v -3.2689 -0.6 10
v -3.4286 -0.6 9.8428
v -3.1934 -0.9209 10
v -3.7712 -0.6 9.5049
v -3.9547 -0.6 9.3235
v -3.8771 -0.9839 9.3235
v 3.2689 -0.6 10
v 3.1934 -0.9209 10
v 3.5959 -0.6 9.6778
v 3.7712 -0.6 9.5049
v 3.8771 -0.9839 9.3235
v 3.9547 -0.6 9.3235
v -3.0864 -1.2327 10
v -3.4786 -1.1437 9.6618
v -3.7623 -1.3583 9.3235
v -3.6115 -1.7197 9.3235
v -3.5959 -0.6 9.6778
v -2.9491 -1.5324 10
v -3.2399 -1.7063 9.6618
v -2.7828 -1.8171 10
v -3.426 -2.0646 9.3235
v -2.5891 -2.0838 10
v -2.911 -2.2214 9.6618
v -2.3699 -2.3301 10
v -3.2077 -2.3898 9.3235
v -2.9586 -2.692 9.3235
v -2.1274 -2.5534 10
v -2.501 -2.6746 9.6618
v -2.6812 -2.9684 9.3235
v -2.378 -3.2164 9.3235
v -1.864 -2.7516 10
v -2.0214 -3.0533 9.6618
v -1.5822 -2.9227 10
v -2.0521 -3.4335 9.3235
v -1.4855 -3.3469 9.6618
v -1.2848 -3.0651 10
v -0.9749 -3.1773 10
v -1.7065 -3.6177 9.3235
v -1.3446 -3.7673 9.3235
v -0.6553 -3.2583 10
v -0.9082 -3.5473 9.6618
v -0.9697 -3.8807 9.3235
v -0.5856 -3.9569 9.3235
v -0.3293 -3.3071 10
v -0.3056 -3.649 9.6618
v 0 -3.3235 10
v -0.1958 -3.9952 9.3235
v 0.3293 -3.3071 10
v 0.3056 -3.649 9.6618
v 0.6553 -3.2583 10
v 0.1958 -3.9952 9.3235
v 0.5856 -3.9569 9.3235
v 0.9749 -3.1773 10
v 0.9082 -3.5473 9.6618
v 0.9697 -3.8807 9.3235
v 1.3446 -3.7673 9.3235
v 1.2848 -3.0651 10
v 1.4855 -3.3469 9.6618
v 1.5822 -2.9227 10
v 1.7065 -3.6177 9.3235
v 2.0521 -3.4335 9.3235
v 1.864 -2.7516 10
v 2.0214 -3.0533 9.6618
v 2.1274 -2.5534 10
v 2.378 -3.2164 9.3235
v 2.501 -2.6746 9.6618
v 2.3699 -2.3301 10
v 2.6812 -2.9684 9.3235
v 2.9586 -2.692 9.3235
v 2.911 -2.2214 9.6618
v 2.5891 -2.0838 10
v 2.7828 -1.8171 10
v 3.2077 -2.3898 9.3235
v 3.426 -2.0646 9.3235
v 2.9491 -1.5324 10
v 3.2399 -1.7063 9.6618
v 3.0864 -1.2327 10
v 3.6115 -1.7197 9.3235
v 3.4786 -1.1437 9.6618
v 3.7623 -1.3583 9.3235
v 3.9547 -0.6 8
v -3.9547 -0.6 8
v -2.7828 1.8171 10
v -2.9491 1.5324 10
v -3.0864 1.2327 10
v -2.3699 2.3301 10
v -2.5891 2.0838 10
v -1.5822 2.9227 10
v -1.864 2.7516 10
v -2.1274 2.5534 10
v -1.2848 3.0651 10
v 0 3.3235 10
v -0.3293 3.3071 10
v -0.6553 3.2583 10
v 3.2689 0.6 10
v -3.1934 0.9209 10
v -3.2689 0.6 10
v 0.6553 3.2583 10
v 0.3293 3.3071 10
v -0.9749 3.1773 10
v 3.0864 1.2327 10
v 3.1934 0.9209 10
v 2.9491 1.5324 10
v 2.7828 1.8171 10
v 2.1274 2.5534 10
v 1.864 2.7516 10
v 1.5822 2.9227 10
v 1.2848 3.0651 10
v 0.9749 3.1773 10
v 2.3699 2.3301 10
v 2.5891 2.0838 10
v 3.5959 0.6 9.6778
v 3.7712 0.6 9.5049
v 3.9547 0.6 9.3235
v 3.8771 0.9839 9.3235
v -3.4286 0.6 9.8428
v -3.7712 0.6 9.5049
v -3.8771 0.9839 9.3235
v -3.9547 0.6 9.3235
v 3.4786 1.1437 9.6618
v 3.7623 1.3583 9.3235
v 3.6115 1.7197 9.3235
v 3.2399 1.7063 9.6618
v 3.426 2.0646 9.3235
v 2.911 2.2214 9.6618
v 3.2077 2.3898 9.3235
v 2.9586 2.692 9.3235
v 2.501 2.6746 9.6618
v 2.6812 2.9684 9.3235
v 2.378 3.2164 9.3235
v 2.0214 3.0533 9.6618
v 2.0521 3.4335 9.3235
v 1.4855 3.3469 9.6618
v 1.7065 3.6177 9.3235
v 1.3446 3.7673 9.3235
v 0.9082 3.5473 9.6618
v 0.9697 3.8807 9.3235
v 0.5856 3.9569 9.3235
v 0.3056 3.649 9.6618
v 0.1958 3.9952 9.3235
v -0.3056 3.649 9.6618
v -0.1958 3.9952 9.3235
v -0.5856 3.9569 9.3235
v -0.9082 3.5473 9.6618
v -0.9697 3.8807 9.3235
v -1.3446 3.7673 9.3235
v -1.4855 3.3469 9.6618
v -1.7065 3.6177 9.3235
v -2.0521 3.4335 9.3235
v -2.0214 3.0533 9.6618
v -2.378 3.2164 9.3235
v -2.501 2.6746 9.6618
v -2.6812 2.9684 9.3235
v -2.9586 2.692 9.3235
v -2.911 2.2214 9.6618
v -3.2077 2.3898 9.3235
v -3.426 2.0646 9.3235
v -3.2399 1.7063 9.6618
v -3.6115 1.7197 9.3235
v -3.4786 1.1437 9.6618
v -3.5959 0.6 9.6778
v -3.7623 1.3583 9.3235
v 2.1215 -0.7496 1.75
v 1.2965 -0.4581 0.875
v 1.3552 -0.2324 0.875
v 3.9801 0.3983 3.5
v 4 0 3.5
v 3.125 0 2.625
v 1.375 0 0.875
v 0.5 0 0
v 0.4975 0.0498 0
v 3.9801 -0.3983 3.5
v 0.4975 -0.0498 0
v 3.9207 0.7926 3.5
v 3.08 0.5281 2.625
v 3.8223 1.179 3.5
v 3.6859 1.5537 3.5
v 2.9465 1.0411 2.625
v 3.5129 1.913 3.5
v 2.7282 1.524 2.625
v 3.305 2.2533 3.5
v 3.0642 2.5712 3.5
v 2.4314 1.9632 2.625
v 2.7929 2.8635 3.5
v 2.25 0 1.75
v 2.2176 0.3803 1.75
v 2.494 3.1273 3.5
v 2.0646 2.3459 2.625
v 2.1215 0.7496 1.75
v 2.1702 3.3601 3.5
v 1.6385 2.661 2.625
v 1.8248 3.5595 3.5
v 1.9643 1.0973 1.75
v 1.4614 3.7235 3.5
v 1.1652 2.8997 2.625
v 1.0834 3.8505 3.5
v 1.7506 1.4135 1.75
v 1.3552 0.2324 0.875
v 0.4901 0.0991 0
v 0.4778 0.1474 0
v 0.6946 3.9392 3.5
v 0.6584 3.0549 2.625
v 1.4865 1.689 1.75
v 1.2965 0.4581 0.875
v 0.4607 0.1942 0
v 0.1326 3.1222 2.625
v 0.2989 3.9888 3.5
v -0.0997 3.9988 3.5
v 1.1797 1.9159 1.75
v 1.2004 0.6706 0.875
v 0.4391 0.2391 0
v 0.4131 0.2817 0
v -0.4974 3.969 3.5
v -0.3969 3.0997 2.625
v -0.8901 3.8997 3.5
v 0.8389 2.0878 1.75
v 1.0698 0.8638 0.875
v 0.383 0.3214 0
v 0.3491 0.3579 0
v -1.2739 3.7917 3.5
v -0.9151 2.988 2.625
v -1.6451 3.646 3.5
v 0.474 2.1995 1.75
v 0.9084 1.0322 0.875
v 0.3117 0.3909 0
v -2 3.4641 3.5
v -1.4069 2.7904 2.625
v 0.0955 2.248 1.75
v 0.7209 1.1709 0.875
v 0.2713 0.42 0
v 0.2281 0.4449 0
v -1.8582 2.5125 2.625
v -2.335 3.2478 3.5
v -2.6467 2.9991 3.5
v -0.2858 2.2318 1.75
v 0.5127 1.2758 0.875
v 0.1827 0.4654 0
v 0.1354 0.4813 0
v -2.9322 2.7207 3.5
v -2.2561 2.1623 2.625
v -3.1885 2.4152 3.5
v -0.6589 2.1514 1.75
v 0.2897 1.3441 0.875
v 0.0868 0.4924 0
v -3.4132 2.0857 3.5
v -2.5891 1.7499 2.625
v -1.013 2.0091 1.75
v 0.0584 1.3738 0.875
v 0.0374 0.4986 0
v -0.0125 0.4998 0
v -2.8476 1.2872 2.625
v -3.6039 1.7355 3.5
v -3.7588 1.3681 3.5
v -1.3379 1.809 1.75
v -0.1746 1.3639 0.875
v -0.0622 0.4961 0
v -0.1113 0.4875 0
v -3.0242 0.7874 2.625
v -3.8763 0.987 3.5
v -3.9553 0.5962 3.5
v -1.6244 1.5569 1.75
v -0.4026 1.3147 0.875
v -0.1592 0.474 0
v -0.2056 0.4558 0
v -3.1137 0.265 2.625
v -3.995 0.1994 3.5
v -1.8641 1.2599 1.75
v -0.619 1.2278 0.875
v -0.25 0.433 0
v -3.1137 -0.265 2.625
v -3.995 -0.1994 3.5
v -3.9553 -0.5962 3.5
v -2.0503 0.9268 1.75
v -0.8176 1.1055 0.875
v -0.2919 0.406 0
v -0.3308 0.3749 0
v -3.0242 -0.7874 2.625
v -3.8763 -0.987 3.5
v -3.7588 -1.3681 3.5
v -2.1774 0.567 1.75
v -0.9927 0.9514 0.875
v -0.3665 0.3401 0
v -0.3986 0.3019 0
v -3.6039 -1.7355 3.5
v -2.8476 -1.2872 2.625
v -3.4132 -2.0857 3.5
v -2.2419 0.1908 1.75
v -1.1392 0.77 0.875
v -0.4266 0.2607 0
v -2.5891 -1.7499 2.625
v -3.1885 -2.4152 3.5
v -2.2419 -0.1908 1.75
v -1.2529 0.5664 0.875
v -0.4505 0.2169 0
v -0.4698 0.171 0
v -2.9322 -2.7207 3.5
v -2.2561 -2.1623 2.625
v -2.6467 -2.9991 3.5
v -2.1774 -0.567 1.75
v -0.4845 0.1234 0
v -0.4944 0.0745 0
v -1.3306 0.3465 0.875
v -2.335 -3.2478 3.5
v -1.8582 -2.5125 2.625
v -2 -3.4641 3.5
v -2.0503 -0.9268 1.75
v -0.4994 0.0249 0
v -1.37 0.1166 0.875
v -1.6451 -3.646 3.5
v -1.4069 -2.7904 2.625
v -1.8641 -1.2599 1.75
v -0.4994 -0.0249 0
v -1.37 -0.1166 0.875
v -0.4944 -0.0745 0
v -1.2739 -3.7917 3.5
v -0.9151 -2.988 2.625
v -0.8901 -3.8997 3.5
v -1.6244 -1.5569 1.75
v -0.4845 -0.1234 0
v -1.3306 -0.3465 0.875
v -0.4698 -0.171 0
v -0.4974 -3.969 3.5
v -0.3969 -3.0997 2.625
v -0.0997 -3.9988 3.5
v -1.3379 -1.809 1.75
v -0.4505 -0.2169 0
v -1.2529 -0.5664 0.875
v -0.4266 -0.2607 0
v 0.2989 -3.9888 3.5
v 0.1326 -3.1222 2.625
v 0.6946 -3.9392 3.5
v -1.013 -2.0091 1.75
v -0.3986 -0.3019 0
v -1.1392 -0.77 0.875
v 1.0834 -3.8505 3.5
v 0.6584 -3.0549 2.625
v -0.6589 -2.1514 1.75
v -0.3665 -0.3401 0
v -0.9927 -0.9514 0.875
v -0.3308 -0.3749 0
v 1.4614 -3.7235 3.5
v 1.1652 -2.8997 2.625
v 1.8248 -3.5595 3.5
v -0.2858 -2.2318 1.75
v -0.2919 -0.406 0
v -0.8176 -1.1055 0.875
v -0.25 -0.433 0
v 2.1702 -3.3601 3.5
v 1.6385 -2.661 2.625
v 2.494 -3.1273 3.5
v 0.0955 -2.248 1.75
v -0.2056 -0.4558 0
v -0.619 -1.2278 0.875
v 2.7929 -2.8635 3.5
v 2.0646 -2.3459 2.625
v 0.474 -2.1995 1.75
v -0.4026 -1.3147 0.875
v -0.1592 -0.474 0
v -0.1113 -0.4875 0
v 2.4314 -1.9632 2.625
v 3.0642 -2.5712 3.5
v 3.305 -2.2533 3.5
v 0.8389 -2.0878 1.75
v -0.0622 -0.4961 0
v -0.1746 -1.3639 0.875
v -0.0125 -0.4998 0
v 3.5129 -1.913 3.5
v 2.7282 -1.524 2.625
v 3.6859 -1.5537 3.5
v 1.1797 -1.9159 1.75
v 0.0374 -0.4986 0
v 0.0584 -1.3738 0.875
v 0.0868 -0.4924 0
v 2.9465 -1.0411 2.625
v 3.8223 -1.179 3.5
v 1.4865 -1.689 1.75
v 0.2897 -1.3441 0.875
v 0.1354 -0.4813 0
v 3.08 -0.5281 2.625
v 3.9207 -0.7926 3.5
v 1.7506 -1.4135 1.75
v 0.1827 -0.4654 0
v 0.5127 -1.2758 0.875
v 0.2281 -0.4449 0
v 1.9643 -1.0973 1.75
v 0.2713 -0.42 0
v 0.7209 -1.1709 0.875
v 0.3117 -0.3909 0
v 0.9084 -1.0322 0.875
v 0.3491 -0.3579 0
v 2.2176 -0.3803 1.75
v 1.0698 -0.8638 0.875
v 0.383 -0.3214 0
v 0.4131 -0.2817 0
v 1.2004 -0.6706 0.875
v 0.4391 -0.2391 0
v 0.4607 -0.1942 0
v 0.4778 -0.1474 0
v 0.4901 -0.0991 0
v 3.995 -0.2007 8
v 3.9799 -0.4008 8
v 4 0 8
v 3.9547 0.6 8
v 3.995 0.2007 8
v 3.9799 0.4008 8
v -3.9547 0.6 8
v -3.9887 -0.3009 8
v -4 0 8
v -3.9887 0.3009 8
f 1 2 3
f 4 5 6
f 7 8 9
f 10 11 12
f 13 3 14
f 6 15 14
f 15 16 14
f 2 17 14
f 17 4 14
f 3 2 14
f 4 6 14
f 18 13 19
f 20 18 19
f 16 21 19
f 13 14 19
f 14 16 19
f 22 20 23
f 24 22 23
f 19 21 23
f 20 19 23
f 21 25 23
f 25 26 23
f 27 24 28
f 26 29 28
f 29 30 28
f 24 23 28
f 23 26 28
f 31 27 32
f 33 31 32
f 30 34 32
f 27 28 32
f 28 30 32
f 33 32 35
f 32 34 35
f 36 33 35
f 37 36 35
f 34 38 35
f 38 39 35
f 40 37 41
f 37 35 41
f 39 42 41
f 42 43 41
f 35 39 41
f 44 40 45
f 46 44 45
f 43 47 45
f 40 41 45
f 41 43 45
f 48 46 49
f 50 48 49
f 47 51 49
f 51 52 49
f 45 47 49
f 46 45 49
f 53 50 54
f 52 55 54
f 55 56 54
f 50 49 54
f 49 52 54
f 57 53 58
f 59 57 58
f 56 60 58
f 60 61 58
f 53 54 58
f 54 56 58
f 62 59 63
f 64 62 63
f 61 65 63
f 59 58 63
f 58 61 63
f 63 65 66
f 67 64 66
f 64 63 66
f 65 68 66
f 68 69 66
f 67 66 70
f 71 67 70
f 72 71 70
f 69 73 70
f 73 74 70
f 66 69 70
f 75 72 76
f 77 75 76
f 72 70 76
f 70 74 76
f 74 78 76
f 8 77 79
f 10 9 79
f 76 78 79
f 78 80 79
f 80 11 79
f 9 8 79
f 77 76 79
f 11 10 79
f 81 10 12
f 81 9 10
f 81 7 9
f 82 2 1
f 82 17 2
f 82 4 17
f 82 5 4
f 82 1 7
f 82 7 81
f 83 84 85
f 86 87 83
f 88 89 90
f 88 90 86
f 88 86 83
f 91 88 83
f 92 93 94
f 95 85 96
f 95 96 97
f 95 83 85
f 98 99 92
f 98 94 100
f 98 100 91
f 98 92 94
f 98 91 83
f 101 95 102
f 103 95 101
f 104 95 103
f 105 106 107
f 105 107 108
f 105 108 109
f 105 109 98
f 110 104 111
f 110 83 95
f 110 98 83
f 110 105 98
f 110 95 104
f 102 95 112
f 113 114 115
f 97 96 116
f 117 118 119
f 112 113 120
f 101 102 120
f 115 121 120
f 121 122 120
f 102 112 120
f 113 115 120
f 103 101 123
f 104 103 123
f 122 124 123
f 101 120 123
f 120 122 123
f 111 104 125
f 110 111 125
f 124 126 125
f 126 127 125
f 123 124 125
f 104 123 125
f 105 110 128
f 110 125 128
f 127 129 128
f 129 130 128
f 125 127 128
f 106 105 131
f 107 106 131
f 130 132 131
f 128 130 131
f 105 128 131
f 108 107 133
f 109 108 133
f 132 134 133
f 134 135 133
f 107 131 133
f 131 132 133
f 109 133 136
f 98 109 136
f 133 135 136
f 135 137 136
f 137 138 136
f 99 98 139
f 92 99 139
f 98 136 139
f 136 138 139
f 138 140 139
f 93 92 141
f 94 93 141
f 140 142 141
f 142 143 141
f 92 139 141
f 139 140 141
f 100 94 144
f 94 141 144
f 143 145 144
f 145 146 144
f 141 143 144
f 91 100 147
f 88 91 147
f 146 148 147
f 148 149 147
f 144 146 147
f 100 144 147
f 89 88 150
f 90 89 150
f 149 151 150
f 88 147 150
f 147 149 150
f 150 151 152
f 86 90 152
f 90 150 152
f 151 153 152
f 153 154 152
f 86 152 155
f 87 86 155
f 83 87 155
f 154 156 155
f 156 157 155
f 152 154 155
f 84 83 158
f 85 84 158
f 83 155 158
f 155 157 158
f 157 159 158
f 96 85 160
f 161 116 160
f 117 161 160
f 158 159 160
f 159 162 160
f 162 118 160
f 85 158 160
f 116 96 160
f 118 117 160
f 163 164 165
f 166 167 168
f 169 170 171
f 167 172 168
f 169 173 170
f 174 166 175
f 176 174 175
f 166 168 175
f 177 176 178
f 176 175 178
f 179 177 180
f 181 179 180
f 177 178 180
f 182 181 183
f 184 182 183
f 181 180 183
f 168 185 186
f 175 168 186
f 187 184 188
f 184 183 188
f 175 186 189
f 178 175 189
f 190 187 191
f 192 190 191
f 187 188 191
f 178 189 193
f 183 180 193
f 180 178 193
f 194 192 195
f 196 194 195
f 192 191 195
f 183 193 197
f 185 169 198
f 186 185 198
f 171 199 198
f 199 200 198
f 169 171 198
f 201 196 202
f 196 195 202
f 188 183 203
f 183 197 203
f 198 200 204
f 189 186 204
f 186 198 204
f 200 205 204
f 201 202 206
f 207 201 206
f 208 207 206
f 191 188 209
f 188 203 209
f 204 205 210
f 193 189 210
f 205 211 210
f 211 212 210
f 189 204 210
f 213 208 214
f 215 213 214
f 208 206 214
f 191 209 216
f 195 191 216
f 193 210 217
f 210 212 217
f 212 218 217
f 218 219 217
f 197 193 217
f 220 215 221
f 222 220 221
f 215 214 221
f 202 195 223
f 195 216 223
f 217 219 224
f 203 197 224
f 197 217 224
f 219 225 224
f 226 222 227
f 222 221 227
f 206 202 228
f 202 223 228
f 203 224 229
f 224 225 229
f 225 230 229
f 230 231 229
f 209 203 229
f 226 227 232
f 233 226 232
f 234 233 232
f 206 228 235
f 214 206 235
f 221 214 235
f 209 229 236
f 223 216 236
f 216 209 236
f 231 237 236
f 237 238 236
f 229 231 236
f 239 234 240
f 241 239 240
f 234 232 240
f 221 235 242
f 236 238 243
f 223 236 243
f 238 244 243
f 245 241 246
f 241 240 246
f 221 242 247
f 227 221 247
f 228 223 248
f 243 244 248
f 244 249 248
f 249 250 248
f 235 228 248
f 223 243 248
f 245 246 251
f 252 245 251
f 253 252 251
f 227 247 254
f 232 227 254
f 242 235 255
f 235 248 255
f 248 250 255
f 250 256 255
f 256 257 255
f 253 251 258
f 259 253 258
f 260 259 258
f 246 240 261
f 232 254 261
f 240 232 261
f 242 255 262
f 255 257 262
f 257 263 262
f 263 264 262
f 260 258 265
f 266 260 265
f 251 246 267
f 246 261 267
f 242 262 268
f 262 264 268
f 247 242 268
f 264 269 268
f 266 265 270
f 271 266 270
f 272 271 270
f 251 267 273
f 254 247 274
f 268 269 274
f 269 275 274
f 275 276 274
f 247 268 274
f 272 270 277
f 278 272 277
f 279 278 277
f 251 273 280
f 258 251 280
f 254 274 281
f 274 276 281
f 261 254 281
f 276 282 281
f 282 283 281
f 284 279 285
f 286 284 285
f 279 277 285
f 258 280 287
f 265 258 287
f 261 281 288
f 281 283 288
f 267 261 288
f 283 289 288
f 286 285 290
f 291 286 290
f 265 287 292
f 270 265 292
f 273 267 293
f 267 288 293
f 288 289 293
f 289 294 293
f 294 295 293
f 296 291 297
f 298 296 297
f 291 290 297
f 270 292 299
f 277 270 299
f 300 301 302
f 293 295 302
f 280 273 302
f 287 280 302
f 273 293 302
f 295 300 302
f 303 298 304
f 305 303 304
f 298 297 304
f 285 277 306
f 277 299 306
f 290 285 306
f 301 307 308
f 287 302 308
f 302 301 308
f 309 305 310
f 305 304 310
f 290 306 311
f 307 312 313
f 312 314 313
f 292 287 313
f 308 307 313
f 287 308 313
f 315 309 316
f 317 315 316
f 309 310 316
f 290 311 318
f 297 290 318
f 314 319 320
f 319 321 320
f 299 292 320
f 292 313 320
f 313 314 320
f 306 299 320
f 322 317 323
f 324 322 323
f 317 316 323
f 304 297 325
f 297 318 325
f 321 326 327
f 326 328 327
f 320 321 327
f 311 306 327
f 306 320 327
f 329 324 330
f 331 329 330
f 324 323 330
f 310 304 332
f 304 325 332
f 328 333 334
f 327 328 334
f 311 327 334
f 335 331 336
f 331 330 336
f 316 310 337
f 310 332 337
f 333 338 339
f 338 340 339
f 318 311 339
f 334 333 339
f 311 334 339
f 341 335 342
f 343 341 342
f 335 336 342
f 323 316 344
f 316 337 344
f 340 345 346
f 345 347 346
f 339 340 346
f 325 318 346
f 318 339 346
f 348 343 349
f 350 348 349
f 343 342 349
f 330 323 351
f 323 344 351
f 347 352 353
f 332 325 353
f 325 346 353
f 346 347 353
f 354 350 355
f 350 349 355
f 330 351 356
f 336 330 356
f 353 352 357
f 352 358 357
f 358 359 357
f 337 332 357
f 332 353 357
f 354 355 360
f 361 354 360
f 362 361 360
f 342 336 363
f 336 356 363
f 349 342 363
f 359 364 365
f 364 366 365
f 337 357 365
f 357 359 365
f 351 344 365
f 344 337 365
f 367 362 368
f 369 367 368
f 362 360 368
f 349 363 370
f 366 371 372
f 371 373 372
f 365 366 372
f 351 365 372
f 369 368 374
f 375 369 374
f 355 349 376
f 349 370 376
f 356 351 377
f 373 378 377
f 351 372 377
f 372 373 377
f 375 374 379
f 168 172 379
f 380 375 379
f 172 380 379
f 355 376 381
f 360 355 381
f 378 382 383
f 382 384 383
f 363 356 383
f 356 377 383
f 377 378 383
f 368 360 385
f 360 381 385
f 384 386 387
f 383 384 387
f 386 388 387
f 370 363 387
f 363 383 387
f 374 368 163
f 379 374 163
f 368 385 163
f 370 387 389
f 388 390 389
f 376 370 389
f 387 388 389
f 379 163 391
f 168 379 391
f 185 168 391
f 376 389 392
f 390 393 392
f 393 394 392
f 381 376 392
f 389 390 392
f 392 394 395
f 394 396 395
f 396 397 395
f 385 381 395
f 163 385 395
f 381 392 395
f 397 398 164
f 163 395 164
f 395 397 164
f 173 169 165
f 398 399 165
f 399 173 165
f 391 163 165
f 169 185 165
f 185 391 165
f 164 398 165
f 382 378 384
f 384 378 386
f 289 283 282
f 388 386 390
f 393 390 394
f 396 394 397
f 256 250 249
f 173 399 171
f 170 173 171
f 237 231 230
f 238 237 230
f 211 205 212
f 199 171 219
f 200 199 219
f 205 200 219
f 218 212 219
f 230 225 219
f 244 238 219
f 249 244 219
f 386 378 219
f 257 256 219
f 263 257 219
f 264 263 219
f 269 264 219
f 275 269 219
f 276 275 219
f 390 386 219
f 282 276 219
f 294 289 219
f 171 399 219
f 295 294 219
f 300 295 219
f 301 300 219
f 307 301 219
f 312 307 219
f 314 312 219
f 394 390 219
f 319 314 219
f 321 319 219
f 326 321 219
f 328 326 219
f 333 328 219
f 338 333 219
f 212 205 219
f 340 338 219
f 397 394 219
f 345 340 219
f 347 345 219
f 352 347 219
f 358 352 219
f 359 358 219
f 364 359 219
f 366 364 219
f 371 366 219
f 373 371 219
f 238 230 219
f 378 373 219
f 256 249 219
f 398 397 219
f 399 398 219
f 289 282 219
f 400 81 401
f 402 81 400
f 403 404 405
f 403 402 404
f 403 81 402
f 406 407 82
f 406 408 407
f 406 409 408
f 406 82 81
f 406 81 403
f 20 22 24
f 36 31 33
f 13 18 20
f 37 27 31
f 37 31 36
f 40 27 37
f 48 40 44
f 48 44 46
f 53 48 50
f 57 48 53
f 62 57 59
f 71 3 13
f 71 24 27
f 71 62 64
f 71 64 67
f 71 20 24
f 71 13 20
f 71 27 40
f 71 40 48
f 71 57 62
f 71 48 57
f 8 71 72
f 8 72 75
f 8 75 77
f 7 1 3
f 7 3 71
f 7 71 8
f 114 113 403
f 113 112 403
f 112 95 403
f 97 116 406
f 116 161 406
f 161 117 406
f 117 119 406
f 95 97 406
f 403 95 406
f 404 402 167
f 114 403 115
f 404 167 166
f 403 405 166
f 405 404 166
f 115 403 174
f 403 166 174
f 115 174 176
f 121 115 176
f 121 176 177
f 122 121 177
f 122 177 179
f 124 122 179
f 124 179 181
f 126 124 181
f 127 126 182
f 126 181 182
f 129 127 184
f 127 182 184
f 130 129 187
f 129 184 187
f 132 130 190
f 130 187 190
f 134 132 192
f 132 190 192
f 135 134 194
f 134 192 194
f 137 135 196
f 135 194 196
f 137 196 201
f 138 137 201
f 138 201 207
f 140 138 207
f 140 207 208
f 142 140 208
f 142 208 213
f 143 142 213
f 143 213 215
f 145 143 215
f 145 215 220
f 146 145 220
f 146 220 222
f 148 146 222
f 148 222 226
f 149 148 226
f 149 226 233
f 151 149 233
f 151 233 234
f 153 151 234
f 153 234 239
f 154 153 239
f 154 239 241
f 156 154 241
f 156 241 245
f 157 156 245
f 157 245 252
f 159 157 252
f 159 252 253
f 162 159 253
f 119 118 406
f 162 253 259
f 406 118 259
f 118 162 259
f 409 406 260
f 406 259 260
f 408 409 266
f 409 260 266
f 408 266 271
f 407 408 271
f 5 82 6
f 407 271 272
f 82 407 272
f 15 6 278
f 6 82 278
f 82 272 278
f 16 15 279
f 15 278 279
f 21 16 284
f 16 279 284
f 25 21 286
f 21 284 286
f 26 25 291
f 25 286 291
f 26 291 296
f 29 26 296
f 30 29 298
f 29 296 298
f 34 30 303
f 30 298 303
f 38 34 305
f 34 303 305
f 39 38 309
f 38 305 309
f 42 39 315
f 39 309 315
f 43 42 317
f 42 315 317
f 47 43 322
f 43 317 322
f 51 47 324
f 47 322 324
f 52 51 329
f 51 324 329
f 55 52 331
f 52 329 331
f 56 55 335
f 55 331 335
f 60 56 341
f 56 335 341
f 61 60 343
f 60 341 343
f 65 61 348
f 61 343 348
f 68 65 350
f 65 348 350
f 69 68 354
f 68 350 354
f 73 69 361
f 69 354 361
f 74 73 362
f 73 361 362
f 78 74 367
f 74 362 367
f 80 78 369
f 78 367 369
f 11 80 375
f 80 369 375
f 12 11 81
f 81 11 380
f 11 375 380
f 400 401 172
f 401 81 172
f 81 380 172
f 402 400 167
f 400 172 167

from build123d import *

# Parameters (mm, degrees)
SKETCH_2_R               = 4
EXTRUDE_1_DEPTH          = 10
CHAMFER_1_SIZE           = 3.5
CUT_EXTRUDE_1_DEPTH      = 12.489125293
CUT_EXTRUDE_1_DEPTH_BACK = 12.489125293
SKETCH_4_W               = 4
SKETCH_4_H               = 1.2


# Read off the part's stored shape, not the designer's step: M8 机械螺纹 螺柱1
with BuildPart() as part:
    # 草图2 → 凸台-拉伸1 (new body)
    with BuildSketch(Plane.XY):
        Circle(SKETCH_2_R)
    extrude(amount=EXTRUDE_1_DEPTH)

    # M8 机械螺纹 螺柱1 outline → M8 机械螺纹 螺柱1 (revolve, cut)
    with BuildSketch(Plane.XZ):
        Polygon((4, 10), (3.3235, 10), (4, 9.3235), align=None)
    revolve(axis=Axis((0, 0, 0), (0, 0, 1)), mode=Mode.SUBTRACT)

    # 倒角1
    chamfer_1_edges = [part.edges().sort_by_distance(p)[0] for p in [
        (-4, 0, 0),
    ]]
    chamfer(chamfer_1_edges, length=CHAMFER_1_SIZE)

    # 草图4 → 切除-拉伸1 (cut, two sides: drawn at the far end of the back side and taken through both)
    with BuildSketch(Plane(origin=(0, 0, 0), x_dir=(0, 0, -1), z_dir=(1, 0, 0)).offset(-CUT_EXTRUDE_1_DEPTH_BACK)):
        with Locations((-10, 0)):
            Rectangle(SKETCH_4_W, SKETCH_4_H)
    extrude(amount=CUT_EXTRUDE_1_DEPTH + CUT_EXTRUDE_1_DEPTH_BACK, mode=Mode.SUBTRACT)


solid = part.part
